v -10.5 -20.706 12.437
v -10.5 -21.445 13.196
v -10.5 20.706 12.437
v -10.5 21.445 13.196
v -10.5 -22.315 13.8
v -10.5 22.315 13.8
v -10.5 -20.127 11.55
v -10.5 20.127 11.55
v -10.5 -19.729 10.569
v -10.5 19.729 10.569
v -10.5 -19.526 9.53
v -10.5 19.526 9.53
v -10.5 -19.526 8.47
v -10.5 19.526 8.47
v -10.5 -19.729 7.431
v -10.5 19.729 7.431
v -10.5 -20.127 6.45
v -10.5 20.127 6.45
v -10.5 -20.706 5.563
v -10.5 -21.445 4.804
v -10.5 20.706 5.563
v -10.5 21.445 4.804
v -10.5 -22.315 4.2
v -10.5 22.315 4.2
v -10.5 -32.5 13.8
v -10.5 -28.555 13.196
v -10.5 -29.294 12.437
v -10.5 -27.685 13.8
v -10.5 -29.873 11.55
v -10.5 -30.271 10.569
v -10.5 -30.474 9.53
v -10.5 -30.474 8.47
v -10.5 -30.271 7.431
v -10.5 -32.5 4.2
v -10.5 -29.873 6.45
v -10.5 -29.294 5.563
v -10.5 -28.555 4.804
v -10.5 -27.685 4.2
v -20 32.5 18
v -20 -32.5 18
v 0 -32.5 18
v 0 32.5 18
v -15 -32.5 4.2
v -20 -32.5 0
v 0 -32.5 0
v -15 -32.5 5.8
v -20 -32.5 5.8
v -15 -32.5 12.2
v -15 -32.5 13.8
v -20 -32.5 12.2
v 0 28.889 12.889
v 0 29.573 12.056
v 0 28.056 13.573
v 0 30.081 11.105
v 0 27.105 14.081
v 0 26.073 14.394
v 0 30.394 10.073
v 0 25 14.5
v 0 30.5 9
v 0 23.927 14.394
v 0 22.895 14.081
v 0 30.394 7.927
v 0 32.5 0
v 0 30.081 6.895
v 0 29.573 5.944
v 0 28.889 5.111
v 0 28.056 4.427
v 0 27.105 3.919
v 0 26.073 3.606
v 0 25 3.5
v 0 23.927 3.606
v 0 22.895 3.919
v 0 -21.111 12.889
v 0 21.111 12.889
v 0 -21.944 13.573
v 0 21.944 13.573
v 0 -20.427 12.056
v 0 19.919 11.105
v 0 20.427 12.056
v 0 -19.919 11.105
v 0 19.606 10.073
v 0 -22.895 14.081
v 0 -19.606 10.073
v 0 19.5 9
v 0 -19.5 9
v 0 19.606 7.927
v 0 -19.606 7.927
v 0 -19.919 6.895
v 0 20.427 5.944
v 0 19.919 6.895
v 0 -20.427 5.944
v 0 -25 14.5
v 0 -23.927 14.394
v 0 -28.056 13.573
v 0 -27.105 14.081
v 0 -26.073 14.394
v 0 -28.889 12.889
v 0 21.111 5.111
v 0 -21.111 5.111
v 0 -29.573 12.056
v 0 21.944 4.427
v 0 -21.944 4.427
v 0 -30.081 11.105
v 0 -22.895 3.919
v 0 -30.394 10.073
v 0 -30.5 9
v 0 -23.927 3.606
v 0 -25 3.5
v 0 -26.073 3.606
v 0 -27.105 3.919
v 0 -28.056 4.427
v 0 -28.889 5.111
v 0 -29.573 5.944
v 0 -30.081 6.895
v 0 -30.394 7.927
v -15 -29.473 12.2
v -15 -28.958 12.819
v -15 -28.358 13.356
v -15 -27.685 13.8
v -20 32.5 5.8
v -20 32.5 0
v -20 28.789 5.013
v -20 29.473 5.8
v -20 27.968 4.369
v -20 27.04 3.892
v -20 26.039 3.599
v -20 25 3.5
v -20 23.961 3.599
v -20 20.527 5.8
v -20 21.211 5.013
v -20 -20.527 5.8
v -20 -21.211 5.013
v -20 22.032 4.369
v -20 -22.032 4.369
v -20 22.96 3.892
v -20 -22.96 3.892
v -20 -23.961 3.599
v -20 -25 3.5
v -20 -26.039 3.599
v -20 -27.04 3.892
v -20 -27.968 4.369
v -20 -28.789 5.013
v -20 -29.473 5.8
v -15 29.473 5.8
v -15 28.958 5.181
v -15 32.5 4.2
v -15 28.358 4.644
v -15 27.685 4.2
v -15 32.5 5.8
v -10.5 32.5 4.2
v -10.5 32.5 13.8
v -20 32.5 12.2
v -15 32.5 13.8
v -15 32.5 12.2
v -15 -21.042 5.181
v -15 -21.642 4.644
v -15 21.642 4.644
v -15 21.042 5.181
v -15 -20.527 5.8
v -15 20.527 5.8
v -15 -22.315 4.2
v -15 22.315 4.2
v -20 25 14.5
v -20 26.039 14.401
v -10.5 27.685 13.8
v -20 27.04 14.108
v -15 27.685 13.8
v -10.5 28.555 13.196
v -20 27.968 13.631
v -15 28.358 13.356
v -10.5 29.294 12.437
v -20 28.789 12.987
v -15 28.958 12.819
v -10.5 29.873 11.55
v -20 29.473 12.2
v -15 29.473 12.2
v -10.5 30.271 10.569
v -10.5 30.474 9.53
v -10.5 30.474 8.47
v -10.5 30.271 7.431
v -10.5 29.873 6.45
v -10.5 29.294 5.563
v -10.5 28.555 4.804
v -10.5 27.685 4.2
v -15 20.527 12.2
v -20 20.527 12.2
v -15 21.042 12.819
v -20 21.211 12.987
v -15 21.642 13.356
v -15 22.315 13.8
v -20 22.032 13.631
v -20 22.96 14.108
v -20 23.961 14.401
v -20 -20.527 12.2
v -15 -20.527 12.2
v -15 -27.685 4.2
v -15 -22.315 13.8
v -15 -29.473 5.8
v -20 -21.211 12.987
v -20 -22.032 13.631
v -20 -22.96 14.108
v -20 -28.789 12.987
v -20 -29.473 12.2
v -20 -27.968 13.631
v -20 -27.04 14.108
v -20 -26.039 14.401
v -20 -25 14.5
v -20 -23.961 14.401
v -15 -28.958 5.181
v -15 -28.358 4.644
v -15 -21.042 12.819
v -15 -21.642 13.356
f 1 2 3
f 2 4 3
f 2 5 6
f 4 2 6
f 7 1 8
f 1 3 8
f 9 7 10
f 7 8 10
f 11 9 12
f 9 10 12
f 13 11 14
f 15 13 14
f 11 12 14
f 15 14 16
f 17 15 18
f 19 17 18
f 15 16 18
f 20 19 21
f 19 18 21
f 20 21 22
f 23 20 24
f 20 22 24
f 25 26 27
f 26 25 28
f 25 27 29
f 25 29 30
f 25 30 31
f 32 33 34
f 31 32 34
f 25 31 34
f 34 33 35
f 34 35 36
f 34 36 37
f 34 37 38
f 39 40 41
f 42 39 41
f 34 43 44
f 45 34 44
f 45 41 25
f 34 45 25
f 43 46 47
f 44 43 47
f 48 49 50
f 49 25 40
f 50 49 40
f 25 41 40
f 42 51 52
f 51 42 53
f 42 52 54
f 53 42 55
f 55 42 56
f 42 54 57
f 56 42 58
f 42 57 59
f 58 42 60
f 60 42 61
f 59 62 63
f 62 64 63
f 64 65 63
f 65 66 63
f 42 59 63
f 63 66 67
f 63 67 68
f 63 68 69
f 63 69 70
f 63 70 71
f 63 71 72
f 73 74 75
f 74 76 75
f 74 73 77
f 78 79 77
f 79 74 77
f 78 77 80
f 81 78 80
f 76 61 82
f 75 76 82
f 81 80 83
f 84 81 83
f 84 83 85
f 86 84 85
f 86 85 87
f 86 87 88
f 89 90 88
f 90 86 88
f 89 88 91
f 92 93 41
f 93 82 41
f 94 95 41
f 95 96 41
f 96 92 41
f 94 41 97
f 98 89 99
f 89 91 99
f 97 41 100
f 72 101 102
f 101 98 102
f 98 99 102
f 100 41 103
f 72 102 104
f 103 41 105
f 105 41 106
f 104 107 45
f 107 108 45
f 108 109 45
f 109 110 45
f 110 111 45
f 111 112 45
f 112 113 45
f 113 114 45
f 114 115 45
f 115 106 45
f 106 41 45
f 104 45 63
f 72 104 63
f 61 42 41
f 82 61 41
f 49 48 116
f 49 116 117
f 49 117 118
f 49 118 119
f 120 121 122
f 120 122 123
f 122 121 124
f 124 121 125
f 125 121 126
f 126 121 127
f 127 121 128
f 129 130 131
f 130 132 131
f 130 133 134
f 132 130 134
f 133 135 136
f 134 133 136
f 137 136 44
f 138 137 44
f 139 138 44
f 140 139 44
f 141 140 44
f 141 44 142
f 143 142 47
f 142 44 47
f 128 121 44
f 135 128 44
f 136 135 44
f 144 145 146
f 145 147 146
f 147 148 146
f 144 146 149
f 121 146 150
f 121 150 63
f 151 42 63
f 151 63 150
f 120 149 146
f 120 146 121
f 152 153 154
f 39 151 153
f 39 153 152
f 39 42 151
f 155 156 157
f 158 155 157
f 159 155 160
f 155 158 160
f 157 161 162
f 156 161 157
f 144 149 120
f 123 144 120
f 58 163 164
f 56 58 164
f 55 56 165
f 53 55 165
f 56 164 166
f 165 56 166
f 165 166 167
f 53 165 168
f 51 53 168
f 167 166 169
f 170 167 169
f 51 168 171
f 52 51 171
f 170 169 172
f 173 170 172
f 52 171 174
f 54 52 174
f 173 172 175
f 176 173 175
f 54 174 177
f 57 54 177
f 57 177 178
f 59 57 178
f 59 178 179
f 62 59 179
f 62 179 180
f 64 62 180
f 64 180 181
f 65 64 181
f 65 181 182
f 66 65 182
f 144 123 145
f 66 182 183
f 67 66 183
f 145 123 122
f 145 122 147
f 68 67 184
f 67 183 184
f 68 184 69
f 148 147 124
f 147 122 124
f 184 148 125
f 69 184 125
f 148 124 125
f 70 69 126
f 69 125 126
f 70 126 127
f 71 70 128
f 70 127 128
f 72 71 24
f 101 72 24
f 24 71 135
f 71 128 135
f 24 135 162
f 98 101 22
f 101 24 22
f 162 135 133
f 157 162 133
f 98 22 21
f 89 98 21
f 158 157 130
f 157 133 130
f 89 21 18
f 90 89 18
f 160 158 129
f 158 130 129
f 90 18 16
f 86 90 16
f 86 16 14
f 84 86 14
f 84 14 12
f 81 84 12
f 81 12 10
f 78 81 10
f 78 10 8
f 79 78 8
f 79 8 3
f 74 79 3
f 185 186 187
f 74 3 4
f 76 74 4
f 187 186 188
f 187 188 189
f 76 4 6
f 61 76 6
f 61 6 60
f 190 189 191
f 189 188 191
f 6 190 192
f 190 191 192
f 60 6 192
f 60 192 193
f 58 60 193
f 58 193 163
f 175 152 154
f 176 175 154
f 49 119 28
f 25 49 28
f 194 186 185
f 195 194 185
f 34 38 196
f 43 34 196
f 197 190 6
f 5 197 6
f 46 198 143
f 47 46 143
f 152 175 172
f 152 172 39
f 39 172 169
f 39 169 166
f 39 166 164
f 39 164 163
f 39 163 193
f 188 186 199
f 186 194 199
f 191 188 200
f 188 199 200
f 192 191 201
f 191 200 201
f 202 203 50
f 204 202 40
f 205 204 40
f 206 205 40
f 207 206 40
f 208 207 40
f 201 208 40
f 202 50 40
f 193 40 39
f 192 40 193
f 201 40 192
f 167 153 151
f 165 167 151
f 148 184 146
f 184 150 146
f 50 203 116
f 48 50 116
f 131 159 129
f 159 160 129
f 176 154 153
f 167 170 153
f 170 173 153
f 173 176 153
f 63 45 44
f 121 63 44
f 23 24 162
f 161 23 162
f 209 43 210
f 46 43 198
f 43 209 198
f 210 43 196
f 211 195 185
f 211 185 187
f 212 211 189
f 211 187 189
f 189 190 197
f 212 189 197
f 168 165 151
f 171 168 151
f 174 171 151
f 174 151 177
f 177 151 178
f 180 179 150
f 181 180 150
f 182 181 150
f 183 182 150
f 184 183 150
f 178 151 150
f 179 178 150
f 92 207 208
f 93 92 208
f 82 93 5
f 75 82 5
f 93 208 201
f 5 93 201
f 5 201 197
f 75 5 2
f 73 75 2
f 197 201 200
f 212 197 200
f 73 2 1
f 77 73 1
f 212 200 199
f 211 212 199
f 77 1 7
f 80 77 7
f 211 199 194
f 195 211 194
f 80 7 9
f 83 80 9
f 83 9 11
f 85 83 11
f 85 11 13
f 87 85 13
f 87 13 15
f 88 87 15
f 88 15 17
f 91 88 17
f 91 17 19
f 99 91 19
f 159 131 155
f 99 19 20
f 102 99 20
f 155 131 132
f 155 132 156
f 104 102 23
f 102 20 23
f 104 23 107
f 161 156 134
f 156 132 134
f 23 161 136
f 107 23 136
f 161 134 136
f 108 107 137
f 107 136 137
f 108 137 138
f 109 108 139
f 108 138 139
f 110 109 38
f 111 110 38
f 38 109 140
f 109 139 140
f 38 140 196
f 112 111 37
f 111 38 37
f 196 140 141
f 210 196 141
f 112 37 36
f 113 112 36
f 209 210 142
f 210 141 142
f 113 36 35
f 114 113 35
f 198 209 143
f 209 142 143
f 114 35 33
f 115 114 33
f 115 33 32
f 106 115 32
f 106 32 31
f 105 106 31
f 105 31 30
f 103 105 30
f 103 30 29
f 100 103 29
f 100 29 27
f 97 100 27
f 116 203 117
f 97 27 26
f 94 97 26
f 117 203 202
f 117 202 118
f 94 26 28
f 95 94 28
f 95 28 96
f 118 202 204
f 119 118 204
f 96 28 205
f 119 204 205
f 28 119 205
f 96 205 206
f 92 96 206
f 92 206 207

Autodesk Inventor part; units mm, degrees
ref_plane "YZ Plane" through (0, 0, 0) normal (1, 0, 0) x (0, 1, 0)
ref_plane "XZ Plane" through (0, 0, 0) normal (0, 1, 0) x (-1, 0, 0)
ref_plane "XY Plane" through (0, 0, 0) normal (0, 0, 1) x (1, 0, 0)
sketch "Sketch1" plane through (0, 0, 0) normal (0, 1, 0) x (-1, 0, 0)
  line L0 (0, 0) -> (20, 0)
  line L1 (20, 0) -> (20, 18)
  line L2 (20, 18) -> (0, 18)
  line L3 (0, 18) -> (0, 0)
  dimension "d0" = 18
  dimension "d1" = 20
extrude "Extrusion1" add sketch "Sketch1" along normal mid plane 65
sketch "Sketch2" plane through (-20, -32.5, 18) normal (-1, 0, 0) x (0, 0, 1)
  circle A0 centre (-9, 7.5) radius 3.25
  circle A1 centre (-9, 57.5) radius 3.25
  circle A2 centre (-9, 7.5) radius 5.5
  circle A3 centre (-9, 57.5) radius 5.5
  line L0 (0, 0) -> (-18, 0) projected
  line L1 (-18, 32.5) -> (8.866, 32.5) construction
  line L2 (-9, 65.0931) -> (-9, 0) construction
  dimension "d4" = 6.5
  dimension "d5" = 6.5
  dimension "d8" = 11
  dimension "d9" = 11
  dimension "d26" = 25
  dimension "d27" = 25
extrude "Extrusion2" cut sketch "Sketch2" against normal through all contours A0 | A1
extrude "Extrusion3" cut sketch "Sketch2" against normal blind 26
sketch "Sketch4" plane through (0, 32.5, 0) normal (0, 1, 0) x (1, 0, 0)
  line L0 (-20, 0) -> (-20, -18) projected
  line L1 (-20, -9) -> (2.4786, -9) construction
  line L2 (-20, -12.2) -> (-15, -12.2)
  line L3 (-15, -12.2) -> (-15, -13.8)
  line L4 (-15, -13.8) -> (-10.5, -13.8)
  line L5 (-10.5, -13.8) -> (-10.5, -4.2)
  line L6 (-10.5, -4.2) -> (-15, -4.2)
  line L7 (-15, -4.2) -> (-15, -5.8)
  line L8 (-15, -5.8) -> (-20, -5.8)
  line L9 (-20, -12.2) -> (-20, -5.8)
  point P0 (0, 0)
  dimension "d28" = 6.4
  dimension "d29" = 4.5
  dimension "d30" = 9.6
  dimension "d31" = 5
extrude "Extrusion4" cut sketch "Sketch4" against normal through all
properties part number "HeadbarHolderBracketAdjustable" material "Aluminum 6061"
